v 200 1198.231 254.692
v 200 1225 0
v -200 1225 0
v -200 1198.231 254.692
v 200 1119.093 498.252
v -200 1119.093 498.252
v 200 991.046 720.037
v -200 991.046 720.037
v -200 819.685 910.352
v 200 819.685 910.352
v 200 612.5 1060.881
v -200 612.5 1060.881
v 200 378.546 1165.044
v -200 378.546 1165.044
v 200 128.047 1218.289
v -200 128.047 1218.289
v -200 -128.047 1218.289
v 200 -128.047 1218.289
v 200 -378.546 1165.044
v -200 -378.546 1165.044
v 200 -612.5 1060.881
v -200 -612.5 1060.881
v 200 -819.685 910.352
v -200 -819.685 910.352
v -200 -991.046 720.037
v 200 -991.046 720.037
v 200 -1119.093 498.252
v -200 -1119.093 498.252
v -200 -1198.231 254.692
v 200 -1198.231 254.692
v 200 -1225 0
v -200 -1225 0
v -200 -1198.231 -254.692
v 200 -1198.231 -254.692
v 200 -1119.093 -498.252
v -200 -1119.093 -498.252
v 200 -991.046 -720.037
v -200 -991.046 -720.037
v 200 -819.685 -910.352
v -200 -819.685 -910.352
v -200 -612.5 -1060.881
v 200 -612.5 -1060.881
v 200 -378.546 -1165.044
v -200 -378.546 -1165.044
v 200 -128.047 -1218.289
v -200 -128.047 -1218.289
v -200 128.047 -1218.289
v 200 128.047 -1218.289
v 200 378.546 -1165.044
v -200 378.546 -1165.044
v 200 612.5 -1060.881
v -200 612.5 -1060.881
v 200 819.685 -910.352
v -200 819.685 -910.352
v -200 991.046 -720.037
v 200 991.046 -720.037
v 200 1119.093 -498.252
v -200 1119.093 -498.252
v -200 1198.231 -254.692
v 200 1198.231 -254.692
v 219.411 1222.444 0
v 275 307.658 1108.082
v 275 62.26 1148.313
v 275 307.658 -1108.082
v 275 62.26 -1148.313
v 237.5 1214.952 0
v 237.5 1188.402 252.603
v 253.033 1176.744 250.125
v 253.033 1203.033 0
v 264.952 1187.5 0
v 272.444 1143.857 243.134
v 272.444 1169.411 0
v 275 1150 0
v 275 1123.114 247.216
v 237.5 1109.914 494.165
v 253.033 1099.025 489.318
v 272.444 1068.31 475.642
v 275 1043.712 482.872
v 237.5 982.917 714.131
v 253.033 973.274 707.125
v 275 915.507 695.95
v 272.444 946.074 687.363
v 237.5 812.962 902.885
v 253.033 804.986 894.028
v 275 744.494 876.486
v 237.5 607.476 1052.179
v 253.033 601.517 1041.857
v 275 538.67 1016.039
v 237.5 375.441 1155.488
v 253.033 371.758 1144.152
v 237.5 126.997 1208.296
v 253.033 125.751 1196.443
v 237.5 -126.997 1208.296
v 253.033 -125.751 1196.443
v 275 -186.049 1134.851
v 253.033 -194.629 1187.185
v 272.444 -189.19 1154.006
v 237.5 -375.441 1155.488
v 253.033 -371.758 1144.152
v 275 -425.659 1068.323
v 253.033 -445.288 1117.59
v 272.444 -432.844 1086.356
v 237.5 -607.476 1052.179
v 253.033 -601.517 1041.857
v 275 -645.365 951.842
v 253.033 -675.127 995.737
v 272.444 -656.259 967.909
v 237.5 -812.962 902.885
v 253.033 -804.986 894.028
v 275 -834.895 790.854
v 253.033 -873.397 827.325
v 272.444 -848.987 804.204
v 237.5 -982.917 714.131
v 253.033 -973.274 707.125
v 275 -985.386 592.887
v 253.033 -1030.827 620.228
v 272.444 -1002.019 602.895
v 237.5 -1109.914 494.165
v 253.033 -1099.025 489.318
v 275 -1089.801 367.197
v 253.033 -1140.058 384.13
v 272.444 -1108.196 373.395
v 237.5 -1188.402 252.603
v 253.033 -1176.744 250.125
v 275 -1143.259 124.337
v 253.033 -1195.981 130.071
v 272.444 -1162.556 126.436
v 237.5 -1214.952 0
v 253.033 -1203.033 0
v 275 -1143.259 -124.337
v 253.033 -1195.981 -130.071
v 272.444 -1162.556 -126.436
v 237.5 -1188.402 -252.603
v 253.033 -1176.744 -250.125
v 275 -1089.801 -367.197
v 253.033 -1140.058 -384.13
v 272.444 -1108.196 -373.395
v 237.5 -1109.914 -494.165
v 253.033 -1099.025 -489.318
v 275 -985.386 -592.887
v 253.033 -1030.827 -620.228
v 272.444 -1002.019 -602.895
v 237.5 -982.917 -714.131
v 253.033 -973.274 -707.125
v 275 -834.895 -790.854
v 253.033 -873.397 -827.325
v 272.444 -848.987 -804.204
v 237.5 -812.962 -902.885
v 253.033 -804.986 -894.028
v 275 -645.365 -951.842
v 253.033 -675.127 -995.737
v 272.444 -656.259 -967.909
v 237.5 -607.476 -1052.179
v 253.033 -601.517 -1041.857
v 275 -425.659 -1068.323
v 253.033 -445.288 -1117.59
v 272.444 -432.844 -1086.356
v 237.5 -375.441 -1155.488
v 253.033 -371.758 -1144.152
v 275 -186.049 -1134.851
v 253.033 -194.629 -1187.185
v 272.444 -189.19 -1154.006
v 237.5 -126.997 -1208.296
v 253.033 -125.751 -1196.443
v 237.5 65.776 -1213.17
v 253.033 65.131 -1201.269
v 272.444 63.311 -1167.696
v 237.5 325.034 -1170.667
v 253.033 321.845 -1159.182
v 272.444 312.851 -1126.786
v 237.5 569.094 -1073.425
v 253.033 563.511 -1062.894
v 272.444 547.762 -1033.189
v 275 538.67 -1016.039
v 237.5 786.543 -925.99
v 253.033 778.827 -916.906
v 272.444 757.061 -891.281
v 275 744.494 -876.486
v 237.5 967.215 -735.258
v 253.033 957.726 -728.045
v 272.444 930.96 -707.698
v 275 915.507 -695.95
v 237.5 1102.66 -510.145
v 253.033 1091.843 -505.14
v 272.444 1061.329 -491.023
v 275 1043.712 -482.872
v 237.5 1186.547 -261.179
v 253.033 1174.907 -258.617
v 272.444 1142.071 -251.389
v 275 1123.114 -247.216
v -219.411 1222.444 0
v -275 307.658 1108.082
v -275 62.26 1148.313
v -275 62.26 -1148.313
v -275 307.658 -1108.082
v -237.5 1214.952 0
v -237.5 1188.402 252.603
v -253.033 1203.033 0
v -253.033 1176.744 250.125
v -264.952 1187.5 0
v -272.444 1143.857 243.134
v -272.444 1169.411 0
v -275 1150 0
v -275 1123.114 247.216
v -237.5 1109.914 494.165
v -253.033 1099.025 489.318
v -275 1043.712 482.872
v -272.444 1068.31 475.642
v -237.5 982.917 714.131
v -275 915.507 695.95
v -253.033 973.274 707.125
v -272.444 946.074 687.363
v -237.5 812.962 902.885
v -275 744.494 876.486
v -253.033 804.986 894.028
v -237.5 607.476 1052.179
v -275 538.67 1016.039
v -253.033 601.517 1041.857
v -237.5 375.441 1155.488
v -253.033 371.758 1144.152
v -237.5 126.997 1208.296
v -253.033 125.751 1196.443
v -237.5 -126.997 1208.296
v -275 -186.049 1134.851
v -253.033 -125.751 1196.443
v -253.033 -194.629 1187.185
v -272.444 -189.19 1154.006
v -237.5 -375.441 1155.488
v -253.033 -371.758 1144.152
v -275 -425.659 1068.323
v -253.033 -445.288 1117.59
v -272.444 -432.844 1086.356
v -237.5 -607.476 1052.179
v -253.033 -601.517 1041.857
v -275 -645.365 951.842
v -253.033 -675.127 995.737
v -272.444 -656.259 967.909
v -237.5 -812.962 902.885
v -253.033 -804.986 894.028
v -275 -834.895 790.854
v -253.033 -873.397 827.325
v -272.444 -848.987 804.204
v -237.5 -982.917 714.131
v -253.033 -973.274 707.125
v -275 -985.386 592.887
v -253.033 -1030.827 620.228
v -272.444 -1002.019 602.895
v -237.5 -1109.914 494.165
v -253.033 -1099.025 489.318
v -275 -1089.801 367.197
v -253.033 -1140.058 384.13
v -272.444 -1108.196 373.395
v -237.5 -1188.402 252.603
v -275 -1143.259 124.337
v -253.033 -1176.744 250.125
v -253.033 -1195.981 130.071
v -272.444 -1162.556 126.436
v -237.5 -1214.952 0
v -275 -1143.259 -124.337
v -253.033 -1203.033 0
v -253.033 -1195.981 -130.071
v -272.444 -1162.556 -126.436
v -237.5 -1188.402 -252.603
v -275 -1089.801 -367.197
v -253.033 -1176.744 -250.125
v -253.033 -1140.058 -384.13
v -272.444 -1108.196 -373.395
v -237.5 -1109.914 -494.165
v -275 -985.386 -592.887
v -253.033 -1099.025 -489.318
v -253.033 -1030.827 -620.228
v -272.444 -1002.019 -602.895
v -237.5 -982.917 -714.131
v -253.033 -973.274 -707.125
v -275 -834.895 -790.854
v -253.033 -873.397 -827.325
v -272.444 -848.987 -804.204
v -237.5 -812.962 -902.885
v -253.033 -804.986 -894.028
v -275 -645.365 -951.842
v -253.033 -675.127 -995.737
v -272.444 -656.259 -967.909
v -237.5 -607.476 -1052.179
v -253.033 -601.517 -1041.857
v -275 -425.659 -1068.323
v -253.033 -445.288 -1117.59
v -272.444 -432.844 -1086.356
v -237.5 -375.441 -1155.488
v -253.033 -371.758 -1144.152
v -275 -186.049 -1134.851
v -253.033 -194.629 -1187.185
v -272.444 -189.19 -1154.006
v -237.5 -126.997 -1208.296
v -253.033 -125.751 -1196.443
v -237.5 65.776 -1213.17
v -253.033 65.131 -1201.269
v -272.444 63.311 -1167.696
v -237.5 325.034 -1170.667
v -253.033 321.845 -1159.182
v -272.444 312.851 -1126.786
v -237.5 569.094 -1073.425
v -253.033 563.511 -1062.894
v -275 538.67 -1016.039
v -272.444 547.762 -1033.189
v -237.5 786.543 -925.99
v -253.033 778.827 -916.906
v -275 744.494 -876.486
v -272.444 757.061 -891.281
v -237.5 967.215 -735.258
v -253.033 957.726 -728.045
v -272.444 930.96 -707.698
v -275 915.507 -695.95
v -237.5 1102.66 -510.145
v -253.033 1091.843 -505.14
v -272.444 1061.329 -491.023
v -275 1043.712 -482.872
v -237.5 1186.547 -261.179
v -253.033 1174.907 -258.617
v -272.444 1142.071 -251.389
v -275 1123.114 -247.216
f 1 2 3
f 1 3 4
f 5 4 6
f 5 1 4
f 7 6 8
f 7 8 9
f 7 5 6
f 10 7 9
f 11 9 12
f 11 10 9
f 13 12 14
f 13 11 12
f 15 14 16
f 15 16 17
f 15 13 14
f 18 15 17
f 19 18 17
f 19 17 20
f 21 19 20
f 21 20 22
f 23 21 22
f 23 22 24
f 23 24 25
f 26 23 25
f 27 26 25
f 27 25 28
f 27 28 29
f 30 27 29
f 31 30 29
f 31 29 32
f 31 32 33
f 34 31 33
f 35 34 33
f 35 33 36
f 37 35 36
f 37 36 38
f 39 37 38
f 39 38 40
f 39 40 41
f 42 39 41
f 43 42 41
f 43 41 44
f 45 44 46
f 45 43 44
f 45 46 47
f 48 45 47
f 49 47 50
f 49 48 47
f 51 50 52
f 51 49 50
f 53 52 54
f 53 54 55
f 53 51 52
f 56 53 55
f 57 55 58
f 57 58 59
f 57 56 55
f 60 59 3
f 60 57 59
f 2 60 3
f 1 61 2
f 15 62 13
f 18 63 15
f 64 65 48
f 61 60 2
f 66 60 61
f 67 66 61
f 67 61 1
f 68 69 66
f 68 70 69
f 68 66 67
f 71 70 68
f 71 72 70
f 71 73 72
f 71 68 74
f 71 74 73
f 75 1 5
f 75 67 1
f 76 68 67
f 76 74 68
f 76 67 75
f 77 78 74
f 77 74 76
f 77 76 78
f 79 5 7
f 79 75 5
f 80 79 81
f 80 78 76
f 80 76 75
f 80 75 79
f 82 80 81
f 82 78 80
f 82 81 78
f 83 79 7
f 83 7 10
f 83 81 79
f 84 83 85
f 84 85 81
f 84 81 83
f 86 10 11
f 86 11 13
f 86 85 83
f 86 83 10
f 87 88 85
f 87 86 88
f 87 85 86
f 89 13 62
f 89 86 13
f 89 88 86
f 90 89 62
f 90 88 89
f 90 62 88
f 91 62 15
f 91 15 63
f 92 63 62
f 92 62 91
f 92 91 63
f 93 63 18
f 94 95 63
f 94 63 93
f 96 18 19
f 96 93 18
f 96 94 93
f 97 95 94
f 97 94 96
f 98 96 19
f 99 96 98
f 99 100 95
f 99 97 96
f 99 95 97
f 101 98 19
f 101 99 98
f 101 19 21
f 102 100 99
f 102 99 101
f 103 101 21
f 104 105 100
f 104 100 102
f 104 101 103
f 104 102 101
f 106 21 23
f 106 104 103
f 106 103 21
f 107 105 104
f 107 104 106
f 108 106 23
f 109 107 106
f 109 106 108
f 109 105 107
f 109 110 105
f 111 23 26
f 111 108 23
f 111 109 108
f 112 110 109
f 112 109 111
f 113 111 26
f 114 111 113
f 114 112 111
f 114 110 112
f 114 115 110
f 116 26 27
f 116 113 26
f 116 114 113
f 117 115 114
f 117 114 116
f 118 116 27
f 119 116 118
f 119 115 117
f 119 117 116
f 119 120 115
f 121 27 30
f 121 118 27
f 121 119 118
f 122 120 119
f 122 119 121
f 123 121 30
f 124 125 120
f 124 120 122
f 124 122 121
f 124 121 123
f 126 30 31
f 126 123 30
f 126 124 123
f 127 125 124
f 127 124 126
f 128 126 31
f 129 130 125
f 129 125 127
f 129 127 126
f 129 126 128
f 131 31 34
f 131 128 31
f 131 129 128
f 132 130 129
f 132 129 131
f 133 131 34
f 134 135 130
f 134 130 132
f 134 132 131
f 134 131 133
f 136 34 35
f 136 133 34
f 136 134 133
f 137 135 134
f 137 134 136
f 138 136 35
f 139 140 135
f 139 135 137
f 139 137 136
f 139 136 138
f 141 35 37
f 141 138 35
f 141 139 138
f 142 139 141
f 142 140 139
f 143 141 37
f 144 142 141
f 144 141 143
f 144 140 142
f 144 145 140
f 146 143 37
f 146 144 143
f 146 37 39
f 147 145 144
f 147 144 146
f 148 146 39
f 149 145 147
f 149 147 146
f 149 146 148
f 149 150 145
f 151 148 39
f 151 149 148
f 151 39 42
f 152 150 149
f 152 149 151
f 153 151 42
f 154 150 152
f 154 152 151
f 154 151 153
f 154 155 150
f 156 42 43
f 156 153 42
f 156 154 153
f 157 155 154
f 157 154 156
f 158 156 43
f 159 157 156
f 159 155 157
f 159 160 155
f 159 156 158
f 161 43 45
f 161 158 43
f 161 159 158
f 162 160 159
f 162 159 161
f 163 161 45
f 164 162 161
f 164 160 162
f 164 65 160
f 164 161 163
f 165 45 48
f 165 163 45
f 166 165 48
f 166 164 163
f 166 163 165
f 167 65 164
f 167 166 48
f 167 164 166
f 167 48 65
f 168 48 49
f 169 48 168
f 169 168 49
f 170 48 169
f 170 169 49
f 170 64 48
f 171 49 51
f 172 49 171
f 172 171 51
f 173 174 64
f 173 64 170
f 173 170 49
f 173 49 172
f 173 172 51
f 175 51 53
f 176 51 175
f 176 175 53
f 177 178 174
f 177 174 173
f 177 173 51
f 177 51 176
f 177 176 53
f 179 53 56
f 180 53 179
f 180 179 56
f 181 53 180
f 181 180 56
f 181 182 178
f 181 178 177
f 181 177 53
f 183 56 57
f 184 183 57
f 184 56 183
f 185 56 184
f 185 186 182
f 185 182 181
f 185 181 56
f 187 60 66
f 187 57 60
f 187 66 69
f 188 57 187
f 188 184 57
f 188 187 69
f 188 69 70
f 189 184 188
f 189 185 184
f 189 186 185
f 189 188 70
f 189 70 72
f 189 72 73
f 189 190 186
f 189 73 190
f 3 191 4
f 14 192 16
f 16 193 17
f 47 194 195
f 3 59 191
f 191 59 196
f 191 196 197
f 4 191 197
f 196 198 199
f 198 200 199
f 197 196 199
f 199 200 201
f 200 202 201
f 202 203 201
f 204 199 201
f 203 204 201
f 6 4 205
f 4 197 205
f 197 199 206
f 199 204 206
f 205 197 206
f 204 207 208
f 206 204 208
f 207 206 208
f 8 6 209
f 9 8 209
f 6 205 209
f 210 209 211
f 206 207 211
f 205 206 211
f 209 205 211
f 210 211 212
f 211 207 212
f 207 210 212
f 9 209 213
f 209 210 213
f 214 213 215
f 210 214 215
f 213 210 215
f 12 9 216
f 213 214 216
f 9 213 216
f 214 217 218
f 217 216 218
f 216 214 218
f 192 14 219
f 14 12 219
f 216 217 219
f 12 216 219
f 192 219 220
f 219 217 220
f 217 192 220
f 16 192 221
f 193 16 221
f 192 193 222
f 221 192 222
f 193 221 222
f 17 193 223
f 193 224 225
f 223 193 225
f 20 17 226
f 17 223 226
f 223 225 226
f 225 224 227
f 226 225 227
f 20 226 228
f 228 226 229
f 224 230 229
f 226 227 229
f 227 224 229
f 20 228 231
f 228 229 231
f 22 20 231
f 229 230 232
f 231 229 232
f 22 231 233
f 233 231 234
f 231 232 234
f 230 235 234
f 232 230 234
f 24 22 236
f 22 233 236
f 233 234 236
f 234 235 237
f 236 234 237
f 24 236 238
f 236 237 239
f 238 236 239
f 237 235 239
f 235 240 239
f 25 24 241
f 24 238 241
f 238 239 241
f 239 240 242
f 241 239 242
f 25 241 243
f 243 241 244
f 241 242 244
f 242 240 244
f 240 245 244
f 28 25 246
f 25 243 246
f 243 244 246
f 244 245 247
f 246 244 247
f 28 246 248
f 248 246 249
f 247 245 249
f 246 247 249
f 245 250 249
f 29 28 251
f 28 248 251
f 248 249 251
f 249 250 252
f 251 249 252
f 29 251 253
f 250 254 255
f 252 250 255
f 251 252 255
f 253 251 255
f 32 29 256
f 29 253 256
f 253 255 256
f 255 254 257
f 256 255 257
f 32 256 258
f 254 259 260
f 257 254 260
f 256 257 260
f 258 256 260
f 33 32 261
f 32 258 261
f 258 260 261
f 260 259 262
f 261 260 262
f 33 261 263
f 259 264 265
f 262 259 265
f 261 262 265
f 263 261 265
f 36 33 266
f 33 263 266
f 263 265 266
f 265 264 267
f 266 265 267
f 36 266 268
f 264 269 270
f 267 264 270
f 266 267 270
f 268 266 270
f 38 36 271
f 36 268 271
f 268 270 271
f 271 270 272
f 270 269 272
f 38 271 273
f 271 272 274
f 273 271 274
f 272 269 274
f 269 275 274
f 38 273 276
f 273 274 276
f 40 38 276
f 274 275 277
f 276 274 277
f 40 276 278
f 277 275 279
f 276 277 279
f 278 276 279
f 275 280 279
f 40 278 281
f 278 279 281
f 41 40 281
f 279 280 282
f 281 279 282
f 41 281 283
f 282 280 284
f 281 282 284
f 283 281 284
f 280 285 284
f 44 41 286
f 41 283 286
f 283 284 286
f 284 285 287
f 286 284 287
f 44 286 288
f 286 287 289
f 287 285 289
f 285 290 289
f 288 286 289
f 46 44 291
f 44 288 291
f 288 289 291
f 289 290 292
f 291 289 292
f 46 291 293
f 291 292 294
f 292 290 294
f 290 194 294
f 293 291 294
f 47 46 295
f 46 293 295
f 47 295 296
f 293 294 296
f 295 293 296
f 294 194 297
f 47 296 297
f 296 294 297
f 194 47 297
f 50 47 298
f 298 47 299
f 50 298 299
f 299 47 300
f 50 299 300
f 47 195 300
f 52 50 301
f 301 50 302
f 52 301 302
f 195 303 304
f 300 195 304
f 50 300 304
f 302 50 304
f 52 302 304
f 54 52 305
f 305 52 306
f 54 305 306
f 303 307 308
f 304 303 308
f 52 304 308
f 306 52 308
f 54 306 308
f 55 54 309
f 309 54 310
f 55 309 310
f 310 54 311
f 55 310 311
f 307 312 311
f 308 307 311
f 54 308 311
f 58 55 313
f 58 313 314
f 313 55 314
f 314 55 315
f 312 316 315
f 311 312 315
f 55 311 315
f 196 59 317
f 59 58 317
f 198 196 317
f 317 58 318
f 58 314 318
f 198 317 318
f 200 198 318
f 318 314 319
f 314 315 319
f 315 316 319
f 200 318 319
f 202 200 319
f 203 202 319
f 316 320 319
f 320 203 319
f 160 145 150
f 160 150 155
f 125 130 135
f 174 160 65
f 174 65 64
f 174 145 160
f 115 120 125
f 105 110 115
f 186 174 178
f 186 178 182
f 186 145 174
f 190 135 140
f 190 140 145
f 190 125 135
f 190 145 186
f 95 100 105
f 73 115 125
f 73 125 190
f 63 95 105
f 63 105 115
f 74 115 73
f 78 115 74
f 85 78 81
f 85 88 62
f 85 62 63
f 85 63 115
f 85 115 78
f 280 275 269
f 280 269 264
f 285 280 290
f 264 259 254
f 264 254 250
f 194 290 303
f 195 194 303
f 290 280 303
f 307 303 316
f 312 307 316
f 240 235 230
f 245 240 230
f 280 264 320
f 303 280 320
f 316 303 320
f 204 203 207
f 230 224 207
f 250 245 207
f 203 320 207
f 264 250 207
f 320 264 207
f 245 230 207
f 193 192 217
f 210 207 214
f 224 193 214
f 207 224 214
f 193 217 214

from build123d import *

# Parameters (mm, degrees)
F0_R     = 1225
F1_DEPTH = 275
F2_R     = 75
F4_ANGLE = 90


with BuildPart() as f1:
    # F0 (on Front) → F1 (new body, symmetric)
    with BuildSketch(Plane.XZ):
        Circle(F0_R)
    extrude(amount=F1_DEPTH, both=True)

    # F2
    f2_edges = [f1.edges().sort_by_distance(p)[0] for p in [
        (-1225, -275, 0),
        (-1225, 275, 0),
    ]]
    fillet(f2_edges, radius=F2_R)


with BuildPart() as f1_1:
    # F4: moved
    add(f1.part.rotate(Axis((0, 0, 383.4756016731), (0, 0, 1)), F4_ANGLE))


solid = f1_1.part
